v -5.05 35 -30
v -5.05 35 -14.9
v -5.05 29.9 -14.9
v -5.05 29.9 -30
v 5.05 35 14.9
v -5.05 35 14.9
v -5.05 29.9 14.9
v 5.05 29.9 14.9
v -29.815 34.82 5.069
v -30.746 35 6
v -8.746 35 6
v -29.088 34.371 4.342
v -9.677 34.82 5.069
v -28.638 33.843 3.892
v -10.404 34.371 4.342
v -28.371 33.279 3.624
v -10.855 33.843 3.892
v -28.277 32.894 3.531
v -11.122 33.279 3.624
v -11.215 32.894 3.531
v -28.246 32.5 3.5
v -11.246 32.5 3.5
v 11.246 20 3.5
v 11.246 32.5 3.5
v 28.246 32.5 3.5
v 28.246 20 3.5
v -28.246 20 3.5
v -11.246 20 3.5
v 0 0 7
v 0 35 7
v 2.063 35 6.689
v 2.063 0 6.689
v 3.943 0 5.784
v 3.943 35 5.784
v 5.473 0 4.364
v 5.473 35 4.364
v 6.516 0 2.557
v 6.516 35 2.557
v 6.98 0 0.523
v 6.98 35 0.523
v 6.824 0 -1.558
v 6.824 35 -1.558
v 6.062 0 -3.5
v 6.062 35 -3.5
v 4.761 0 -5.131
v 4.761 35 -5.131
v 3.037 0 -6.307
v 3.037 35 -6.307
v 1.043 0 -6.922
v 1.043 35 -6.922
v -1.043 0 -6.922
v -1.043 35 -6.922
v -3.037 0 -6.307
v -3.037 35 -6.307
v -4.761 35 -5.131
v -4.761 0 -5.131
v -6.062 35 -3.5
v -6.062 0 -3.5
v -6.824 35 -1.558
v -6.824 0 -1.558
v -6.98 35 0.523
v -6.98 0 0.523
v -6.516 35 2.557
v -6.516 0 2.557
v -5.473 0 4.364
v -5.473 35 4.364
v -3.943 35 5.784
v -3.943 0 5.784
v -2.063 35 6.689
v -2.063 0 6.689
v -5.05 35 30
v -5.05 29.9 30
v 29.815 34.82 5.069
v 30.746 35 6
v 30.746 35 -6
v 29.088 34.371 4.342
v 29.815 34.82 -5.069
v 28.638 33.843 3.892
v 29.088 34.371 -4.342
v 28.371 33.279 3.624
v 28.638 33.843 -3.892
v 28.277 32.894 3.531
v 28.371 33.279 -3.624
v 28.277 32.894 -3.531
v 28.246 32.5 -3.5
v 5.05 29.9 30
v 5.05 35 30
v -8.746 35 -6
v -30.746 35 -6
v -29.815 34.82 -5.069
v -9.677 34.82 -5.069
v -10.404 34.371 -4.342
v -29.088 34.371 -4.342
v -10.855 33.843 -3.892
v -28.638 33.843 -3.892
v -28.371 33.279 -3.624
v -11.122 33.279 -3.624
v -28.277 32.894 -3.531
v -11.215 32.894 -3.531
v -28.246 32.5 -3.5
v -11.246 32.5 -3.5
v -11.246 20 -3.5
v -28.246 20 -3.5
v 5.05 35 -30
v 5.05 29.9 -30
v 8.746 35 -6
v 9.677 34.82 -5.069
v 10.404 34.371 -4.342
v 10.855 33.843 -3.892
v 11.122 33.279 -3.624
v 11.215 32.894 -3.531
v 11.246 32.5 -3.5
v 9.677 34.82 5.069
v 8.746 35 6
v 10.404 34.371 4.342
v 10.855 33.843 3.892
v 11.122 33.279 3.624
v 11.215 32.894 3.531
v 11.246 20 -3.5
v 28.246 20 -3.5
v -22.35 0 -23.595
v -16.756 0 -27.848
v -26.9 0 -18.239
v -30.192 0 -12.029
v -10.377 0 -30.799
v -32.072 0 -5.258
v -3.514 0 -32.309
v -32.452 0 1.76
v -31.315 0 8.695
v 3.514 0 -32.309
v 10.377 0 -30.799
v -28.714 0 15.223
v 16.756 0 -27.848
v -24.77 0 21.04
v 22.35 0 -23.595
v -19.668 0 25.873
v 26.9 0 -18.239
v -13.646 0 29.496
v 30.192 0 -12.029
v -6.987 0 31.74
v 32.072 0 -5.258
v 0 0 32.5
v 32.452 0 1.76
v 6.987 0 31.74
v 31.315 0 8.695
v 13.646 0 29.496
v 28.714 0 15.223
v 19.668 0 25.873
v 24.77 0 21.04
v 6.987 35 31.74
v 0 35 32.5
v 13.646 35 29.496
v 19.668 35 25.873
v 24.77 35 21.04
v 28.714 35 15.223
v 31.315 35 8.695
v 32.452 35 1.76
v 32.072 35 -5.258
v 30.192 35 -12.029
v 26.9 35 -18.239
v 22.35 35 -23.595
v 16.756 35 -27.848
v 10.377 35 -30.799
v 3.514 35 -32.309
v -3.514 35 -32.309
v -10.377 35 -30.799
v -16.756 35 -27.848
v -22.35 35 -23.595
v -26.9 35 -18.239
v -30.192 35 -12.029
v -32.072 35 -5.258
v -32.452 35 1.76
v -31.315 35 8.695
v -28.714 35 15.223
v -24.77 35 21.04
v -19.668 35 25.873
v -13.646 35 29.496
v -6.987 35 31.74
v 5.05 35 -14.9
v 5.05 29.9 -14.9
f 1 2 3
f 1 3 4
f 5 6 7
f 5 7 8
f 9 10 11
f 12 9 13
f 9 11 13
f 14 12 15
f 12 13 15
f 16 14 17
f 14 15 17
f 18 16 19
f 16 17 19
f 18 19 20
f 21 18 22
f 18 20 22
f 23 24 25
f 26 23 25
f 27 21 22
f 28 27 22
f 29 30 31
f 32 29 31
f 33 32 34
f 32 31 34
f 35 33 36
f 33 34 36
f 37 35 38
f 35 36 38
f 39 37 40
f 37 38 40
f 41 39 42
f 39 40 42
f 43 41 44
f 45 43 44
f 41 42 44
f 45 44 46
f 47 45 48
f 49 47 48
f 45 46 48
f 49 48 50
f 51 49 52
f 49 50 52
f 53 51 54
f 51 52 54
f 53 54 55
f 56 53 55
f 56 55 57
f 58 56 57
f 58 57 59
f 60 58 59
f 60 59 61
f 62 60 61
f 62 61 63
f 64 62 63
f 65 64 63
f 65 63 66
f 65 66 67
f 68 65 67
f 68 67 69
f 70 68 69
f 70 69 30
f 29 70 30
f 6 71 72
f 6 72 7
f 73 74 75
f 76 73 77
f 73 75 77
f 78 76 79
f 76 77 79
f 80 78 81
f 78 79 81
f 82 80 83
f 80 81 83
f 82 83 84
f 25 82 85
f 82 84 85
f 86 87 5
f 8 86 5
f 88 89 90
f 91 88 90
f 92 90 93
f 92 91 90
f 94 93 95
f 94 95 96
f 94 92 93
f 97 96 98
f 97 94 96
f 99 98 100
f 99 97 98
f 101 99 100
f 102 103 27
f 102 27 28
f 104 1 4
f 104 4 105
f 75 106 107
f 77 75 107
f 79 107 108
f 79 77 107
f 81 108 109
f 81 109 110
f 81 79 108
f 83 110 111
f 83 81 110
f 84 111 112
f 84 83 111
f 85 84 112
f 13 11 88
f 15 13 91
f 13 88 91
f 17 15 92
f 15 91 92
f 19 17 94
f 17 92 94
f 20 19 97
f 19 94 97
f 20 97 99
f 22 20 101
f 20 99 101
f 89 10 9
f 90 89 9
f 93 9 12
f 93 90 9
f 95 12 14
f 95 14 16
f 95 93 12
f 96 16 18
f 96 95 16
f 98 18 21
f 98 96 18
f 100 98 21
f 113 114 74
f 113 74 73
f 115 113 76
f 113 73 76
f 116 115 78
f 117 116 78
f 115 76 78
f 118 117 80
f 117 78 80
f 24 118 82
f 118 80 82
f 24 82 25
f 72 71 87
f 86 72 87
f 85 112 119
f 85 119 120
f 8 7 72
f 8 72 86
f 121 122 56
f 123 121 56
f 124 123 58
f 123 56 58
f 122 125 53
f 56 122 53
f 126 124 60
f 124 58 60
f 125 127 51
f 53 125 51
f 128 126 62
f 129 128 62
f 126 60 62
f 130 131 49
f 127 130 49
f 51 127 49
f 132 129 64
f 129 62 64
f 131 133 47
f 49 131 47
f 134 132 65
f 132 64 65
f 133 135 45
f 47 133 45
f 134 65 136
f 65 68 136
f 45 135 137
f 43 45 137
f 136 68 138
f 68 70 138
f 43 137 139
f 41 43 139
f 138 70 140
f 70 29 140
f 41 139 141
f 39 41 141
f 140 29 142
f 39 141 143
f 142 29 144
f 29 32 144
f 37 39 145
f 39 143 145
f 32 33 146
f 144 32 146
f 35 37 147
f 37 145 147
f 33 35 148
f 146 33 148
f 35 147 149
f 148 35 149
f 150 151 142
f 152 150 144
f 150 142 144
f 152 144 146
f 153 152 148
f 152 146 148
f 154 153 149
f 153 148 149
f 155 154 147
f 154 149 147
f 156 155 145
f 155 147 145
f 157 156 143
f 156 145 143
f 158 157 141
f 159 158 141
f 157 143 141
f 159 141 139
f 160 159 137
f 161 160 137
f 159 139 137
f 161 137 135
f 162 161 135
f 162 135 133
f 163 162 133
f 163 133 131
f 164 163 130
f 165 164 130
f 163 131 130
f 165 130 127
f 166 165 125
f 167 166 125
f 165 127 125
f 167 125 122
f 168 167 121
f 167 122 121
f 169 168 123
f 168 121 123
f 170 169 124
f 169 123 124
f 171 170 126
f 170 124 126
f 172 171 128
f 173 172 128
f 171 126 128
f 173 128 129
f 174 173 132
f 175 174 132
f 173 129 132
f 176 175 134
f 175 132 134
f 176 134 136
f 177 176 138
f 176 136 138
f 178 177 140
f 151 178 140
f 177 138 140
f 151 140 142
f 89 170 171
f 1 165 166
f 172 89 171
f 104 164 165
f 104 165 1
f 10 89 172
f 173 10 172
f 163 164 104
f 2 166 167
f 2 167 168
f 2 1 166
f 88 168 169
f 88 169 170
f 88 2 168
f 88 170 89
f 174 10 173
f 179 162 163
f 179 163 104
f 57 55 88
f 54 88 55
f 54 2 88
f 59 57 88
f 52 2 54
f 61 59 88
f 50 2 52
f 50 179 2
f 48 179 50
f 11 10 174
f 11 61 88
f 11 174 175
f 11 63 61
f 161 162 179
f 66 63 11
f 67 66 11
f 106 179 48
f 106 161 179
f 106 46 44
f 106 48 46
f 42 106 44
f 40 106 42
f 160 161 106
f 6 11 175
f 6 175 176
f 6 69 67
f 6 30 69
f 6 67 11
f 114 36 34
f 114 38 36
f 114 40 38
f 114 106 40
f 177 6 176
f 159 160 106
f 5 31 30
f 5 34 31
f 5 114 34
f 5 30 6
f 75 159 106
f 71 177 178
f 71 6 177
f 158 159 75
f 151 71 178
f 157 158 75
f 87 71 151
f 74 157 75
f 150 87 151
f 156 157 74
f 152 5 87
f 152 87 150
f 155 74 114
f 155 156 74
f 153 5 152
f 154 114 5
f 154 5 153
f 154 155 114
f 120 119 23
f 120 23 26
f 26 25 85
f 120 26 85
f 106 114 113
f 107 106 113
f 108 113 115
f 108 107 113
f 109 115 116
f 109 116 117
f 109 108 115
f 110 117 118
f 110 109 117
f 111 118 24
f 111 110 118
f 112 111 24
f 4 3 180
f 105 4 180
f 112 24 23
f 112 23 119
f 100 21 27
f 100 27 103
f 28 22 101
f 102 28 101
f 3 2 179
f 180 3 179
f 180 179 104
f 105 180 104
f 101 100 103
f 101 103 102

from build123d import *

# Parameters (mm, degrees)
SKETCH1_R           = 32.5
BOSS_EXTRUDE1_DEPTH = 35
SKETCH2_W           = 10.1
SKETCH2_H           = 15.1
CUT_EXTRUDE1_DEPTH  = 5.1
SKETCH3_R           = 7
CUT_EXTRUDE2_DEPTH  = 58.771100041
SKETCH4_W           = 17
SKETCH4_H           = 7
CUT_EXTRUDE3_DEPTH  = 15
FILLET1_R           = 2.5


with BuildPart() as part:
    # Sketch1 → Boss-Extrude1 (new body)
    with BuildSketch(Plane(origin=(0, 0, 0), x_dir=(1, 0, 0), z_dir=(0, 1, 0))):
        with Locations(Location((0, 0, 0), (0, 0, 270))):
            Circle(SKETCH1_R)
    extrude(amount=BOSS_EXTRUDE1_DEPTH)

    # Sketch2 → Cut-Extrude1 (cut)
    with BuildSketch(Plane(origin=(0, 35, 0), x_dir=(1, 0, 0), z_dir=(0, 1, 0))):
        with Locations((0, 22.45)):
            Rectangle(SKETCH2_W, SKETCH2_H)
        with Locations((0, -22.45)):
            Rectangle(SKETCH2_W, SKETCH2_H)
    extrude(amount=-CUT_EXTRUDE1_DEPTH, mode=Mode.SUBTRACT)

    # Sketch3 → Cut-Extrude2 (cut, through all)
    with BuildSketch(Plane(origin=(0, 35, 0), x_dir=(1, 0, 0), z_dir=(0, 1, 0))):
        with Locations(Location((0, 0, 0), (0, 0, 270))):
            Circle(SKETCH3_R)
    extrude(amount=-CUT_EXTRUDE2_DEPTH, mode=Mode.SUBTRACT)

    # Sketch4 → Cut-Extrude3 (cut)
    with BuildSketch(Plane(origin=(0, 35, 0), x_dir=(1, 0, 0), z_dir=(0, 1, 0))):
        with Locations((19.746175473, 0)):
            Rectangle(SKETCH4_W, SKETCH4_H)
        with Locations((-19.746175473, 0)):
            Rectangle(SKETCH4_W, SKETCH4_H)
    extrude(amount=-CUT_EXTRUDE3_DEPTH, mode=Mode.SUBTRACT)

    # Fillet1
    fillet1_edges = [part.edges().sort_by_distance(p)[0] for p in [
        (28.246175473, 35, 0),
        (19.746175473, 35, -3.5),
        (11.246175473, 35, 0),
        (19.746175473, 35, 3.5),
        (-19.746175473, 35, 3.5),
        (-11.246175473, 35, 0),
        (-19.746175473, 35, -3.5),
        (-28.246175473, 35, 0),
    ]]
    fillet(fillet1_edges, radius=FILLET1_R)


solid = part.part
